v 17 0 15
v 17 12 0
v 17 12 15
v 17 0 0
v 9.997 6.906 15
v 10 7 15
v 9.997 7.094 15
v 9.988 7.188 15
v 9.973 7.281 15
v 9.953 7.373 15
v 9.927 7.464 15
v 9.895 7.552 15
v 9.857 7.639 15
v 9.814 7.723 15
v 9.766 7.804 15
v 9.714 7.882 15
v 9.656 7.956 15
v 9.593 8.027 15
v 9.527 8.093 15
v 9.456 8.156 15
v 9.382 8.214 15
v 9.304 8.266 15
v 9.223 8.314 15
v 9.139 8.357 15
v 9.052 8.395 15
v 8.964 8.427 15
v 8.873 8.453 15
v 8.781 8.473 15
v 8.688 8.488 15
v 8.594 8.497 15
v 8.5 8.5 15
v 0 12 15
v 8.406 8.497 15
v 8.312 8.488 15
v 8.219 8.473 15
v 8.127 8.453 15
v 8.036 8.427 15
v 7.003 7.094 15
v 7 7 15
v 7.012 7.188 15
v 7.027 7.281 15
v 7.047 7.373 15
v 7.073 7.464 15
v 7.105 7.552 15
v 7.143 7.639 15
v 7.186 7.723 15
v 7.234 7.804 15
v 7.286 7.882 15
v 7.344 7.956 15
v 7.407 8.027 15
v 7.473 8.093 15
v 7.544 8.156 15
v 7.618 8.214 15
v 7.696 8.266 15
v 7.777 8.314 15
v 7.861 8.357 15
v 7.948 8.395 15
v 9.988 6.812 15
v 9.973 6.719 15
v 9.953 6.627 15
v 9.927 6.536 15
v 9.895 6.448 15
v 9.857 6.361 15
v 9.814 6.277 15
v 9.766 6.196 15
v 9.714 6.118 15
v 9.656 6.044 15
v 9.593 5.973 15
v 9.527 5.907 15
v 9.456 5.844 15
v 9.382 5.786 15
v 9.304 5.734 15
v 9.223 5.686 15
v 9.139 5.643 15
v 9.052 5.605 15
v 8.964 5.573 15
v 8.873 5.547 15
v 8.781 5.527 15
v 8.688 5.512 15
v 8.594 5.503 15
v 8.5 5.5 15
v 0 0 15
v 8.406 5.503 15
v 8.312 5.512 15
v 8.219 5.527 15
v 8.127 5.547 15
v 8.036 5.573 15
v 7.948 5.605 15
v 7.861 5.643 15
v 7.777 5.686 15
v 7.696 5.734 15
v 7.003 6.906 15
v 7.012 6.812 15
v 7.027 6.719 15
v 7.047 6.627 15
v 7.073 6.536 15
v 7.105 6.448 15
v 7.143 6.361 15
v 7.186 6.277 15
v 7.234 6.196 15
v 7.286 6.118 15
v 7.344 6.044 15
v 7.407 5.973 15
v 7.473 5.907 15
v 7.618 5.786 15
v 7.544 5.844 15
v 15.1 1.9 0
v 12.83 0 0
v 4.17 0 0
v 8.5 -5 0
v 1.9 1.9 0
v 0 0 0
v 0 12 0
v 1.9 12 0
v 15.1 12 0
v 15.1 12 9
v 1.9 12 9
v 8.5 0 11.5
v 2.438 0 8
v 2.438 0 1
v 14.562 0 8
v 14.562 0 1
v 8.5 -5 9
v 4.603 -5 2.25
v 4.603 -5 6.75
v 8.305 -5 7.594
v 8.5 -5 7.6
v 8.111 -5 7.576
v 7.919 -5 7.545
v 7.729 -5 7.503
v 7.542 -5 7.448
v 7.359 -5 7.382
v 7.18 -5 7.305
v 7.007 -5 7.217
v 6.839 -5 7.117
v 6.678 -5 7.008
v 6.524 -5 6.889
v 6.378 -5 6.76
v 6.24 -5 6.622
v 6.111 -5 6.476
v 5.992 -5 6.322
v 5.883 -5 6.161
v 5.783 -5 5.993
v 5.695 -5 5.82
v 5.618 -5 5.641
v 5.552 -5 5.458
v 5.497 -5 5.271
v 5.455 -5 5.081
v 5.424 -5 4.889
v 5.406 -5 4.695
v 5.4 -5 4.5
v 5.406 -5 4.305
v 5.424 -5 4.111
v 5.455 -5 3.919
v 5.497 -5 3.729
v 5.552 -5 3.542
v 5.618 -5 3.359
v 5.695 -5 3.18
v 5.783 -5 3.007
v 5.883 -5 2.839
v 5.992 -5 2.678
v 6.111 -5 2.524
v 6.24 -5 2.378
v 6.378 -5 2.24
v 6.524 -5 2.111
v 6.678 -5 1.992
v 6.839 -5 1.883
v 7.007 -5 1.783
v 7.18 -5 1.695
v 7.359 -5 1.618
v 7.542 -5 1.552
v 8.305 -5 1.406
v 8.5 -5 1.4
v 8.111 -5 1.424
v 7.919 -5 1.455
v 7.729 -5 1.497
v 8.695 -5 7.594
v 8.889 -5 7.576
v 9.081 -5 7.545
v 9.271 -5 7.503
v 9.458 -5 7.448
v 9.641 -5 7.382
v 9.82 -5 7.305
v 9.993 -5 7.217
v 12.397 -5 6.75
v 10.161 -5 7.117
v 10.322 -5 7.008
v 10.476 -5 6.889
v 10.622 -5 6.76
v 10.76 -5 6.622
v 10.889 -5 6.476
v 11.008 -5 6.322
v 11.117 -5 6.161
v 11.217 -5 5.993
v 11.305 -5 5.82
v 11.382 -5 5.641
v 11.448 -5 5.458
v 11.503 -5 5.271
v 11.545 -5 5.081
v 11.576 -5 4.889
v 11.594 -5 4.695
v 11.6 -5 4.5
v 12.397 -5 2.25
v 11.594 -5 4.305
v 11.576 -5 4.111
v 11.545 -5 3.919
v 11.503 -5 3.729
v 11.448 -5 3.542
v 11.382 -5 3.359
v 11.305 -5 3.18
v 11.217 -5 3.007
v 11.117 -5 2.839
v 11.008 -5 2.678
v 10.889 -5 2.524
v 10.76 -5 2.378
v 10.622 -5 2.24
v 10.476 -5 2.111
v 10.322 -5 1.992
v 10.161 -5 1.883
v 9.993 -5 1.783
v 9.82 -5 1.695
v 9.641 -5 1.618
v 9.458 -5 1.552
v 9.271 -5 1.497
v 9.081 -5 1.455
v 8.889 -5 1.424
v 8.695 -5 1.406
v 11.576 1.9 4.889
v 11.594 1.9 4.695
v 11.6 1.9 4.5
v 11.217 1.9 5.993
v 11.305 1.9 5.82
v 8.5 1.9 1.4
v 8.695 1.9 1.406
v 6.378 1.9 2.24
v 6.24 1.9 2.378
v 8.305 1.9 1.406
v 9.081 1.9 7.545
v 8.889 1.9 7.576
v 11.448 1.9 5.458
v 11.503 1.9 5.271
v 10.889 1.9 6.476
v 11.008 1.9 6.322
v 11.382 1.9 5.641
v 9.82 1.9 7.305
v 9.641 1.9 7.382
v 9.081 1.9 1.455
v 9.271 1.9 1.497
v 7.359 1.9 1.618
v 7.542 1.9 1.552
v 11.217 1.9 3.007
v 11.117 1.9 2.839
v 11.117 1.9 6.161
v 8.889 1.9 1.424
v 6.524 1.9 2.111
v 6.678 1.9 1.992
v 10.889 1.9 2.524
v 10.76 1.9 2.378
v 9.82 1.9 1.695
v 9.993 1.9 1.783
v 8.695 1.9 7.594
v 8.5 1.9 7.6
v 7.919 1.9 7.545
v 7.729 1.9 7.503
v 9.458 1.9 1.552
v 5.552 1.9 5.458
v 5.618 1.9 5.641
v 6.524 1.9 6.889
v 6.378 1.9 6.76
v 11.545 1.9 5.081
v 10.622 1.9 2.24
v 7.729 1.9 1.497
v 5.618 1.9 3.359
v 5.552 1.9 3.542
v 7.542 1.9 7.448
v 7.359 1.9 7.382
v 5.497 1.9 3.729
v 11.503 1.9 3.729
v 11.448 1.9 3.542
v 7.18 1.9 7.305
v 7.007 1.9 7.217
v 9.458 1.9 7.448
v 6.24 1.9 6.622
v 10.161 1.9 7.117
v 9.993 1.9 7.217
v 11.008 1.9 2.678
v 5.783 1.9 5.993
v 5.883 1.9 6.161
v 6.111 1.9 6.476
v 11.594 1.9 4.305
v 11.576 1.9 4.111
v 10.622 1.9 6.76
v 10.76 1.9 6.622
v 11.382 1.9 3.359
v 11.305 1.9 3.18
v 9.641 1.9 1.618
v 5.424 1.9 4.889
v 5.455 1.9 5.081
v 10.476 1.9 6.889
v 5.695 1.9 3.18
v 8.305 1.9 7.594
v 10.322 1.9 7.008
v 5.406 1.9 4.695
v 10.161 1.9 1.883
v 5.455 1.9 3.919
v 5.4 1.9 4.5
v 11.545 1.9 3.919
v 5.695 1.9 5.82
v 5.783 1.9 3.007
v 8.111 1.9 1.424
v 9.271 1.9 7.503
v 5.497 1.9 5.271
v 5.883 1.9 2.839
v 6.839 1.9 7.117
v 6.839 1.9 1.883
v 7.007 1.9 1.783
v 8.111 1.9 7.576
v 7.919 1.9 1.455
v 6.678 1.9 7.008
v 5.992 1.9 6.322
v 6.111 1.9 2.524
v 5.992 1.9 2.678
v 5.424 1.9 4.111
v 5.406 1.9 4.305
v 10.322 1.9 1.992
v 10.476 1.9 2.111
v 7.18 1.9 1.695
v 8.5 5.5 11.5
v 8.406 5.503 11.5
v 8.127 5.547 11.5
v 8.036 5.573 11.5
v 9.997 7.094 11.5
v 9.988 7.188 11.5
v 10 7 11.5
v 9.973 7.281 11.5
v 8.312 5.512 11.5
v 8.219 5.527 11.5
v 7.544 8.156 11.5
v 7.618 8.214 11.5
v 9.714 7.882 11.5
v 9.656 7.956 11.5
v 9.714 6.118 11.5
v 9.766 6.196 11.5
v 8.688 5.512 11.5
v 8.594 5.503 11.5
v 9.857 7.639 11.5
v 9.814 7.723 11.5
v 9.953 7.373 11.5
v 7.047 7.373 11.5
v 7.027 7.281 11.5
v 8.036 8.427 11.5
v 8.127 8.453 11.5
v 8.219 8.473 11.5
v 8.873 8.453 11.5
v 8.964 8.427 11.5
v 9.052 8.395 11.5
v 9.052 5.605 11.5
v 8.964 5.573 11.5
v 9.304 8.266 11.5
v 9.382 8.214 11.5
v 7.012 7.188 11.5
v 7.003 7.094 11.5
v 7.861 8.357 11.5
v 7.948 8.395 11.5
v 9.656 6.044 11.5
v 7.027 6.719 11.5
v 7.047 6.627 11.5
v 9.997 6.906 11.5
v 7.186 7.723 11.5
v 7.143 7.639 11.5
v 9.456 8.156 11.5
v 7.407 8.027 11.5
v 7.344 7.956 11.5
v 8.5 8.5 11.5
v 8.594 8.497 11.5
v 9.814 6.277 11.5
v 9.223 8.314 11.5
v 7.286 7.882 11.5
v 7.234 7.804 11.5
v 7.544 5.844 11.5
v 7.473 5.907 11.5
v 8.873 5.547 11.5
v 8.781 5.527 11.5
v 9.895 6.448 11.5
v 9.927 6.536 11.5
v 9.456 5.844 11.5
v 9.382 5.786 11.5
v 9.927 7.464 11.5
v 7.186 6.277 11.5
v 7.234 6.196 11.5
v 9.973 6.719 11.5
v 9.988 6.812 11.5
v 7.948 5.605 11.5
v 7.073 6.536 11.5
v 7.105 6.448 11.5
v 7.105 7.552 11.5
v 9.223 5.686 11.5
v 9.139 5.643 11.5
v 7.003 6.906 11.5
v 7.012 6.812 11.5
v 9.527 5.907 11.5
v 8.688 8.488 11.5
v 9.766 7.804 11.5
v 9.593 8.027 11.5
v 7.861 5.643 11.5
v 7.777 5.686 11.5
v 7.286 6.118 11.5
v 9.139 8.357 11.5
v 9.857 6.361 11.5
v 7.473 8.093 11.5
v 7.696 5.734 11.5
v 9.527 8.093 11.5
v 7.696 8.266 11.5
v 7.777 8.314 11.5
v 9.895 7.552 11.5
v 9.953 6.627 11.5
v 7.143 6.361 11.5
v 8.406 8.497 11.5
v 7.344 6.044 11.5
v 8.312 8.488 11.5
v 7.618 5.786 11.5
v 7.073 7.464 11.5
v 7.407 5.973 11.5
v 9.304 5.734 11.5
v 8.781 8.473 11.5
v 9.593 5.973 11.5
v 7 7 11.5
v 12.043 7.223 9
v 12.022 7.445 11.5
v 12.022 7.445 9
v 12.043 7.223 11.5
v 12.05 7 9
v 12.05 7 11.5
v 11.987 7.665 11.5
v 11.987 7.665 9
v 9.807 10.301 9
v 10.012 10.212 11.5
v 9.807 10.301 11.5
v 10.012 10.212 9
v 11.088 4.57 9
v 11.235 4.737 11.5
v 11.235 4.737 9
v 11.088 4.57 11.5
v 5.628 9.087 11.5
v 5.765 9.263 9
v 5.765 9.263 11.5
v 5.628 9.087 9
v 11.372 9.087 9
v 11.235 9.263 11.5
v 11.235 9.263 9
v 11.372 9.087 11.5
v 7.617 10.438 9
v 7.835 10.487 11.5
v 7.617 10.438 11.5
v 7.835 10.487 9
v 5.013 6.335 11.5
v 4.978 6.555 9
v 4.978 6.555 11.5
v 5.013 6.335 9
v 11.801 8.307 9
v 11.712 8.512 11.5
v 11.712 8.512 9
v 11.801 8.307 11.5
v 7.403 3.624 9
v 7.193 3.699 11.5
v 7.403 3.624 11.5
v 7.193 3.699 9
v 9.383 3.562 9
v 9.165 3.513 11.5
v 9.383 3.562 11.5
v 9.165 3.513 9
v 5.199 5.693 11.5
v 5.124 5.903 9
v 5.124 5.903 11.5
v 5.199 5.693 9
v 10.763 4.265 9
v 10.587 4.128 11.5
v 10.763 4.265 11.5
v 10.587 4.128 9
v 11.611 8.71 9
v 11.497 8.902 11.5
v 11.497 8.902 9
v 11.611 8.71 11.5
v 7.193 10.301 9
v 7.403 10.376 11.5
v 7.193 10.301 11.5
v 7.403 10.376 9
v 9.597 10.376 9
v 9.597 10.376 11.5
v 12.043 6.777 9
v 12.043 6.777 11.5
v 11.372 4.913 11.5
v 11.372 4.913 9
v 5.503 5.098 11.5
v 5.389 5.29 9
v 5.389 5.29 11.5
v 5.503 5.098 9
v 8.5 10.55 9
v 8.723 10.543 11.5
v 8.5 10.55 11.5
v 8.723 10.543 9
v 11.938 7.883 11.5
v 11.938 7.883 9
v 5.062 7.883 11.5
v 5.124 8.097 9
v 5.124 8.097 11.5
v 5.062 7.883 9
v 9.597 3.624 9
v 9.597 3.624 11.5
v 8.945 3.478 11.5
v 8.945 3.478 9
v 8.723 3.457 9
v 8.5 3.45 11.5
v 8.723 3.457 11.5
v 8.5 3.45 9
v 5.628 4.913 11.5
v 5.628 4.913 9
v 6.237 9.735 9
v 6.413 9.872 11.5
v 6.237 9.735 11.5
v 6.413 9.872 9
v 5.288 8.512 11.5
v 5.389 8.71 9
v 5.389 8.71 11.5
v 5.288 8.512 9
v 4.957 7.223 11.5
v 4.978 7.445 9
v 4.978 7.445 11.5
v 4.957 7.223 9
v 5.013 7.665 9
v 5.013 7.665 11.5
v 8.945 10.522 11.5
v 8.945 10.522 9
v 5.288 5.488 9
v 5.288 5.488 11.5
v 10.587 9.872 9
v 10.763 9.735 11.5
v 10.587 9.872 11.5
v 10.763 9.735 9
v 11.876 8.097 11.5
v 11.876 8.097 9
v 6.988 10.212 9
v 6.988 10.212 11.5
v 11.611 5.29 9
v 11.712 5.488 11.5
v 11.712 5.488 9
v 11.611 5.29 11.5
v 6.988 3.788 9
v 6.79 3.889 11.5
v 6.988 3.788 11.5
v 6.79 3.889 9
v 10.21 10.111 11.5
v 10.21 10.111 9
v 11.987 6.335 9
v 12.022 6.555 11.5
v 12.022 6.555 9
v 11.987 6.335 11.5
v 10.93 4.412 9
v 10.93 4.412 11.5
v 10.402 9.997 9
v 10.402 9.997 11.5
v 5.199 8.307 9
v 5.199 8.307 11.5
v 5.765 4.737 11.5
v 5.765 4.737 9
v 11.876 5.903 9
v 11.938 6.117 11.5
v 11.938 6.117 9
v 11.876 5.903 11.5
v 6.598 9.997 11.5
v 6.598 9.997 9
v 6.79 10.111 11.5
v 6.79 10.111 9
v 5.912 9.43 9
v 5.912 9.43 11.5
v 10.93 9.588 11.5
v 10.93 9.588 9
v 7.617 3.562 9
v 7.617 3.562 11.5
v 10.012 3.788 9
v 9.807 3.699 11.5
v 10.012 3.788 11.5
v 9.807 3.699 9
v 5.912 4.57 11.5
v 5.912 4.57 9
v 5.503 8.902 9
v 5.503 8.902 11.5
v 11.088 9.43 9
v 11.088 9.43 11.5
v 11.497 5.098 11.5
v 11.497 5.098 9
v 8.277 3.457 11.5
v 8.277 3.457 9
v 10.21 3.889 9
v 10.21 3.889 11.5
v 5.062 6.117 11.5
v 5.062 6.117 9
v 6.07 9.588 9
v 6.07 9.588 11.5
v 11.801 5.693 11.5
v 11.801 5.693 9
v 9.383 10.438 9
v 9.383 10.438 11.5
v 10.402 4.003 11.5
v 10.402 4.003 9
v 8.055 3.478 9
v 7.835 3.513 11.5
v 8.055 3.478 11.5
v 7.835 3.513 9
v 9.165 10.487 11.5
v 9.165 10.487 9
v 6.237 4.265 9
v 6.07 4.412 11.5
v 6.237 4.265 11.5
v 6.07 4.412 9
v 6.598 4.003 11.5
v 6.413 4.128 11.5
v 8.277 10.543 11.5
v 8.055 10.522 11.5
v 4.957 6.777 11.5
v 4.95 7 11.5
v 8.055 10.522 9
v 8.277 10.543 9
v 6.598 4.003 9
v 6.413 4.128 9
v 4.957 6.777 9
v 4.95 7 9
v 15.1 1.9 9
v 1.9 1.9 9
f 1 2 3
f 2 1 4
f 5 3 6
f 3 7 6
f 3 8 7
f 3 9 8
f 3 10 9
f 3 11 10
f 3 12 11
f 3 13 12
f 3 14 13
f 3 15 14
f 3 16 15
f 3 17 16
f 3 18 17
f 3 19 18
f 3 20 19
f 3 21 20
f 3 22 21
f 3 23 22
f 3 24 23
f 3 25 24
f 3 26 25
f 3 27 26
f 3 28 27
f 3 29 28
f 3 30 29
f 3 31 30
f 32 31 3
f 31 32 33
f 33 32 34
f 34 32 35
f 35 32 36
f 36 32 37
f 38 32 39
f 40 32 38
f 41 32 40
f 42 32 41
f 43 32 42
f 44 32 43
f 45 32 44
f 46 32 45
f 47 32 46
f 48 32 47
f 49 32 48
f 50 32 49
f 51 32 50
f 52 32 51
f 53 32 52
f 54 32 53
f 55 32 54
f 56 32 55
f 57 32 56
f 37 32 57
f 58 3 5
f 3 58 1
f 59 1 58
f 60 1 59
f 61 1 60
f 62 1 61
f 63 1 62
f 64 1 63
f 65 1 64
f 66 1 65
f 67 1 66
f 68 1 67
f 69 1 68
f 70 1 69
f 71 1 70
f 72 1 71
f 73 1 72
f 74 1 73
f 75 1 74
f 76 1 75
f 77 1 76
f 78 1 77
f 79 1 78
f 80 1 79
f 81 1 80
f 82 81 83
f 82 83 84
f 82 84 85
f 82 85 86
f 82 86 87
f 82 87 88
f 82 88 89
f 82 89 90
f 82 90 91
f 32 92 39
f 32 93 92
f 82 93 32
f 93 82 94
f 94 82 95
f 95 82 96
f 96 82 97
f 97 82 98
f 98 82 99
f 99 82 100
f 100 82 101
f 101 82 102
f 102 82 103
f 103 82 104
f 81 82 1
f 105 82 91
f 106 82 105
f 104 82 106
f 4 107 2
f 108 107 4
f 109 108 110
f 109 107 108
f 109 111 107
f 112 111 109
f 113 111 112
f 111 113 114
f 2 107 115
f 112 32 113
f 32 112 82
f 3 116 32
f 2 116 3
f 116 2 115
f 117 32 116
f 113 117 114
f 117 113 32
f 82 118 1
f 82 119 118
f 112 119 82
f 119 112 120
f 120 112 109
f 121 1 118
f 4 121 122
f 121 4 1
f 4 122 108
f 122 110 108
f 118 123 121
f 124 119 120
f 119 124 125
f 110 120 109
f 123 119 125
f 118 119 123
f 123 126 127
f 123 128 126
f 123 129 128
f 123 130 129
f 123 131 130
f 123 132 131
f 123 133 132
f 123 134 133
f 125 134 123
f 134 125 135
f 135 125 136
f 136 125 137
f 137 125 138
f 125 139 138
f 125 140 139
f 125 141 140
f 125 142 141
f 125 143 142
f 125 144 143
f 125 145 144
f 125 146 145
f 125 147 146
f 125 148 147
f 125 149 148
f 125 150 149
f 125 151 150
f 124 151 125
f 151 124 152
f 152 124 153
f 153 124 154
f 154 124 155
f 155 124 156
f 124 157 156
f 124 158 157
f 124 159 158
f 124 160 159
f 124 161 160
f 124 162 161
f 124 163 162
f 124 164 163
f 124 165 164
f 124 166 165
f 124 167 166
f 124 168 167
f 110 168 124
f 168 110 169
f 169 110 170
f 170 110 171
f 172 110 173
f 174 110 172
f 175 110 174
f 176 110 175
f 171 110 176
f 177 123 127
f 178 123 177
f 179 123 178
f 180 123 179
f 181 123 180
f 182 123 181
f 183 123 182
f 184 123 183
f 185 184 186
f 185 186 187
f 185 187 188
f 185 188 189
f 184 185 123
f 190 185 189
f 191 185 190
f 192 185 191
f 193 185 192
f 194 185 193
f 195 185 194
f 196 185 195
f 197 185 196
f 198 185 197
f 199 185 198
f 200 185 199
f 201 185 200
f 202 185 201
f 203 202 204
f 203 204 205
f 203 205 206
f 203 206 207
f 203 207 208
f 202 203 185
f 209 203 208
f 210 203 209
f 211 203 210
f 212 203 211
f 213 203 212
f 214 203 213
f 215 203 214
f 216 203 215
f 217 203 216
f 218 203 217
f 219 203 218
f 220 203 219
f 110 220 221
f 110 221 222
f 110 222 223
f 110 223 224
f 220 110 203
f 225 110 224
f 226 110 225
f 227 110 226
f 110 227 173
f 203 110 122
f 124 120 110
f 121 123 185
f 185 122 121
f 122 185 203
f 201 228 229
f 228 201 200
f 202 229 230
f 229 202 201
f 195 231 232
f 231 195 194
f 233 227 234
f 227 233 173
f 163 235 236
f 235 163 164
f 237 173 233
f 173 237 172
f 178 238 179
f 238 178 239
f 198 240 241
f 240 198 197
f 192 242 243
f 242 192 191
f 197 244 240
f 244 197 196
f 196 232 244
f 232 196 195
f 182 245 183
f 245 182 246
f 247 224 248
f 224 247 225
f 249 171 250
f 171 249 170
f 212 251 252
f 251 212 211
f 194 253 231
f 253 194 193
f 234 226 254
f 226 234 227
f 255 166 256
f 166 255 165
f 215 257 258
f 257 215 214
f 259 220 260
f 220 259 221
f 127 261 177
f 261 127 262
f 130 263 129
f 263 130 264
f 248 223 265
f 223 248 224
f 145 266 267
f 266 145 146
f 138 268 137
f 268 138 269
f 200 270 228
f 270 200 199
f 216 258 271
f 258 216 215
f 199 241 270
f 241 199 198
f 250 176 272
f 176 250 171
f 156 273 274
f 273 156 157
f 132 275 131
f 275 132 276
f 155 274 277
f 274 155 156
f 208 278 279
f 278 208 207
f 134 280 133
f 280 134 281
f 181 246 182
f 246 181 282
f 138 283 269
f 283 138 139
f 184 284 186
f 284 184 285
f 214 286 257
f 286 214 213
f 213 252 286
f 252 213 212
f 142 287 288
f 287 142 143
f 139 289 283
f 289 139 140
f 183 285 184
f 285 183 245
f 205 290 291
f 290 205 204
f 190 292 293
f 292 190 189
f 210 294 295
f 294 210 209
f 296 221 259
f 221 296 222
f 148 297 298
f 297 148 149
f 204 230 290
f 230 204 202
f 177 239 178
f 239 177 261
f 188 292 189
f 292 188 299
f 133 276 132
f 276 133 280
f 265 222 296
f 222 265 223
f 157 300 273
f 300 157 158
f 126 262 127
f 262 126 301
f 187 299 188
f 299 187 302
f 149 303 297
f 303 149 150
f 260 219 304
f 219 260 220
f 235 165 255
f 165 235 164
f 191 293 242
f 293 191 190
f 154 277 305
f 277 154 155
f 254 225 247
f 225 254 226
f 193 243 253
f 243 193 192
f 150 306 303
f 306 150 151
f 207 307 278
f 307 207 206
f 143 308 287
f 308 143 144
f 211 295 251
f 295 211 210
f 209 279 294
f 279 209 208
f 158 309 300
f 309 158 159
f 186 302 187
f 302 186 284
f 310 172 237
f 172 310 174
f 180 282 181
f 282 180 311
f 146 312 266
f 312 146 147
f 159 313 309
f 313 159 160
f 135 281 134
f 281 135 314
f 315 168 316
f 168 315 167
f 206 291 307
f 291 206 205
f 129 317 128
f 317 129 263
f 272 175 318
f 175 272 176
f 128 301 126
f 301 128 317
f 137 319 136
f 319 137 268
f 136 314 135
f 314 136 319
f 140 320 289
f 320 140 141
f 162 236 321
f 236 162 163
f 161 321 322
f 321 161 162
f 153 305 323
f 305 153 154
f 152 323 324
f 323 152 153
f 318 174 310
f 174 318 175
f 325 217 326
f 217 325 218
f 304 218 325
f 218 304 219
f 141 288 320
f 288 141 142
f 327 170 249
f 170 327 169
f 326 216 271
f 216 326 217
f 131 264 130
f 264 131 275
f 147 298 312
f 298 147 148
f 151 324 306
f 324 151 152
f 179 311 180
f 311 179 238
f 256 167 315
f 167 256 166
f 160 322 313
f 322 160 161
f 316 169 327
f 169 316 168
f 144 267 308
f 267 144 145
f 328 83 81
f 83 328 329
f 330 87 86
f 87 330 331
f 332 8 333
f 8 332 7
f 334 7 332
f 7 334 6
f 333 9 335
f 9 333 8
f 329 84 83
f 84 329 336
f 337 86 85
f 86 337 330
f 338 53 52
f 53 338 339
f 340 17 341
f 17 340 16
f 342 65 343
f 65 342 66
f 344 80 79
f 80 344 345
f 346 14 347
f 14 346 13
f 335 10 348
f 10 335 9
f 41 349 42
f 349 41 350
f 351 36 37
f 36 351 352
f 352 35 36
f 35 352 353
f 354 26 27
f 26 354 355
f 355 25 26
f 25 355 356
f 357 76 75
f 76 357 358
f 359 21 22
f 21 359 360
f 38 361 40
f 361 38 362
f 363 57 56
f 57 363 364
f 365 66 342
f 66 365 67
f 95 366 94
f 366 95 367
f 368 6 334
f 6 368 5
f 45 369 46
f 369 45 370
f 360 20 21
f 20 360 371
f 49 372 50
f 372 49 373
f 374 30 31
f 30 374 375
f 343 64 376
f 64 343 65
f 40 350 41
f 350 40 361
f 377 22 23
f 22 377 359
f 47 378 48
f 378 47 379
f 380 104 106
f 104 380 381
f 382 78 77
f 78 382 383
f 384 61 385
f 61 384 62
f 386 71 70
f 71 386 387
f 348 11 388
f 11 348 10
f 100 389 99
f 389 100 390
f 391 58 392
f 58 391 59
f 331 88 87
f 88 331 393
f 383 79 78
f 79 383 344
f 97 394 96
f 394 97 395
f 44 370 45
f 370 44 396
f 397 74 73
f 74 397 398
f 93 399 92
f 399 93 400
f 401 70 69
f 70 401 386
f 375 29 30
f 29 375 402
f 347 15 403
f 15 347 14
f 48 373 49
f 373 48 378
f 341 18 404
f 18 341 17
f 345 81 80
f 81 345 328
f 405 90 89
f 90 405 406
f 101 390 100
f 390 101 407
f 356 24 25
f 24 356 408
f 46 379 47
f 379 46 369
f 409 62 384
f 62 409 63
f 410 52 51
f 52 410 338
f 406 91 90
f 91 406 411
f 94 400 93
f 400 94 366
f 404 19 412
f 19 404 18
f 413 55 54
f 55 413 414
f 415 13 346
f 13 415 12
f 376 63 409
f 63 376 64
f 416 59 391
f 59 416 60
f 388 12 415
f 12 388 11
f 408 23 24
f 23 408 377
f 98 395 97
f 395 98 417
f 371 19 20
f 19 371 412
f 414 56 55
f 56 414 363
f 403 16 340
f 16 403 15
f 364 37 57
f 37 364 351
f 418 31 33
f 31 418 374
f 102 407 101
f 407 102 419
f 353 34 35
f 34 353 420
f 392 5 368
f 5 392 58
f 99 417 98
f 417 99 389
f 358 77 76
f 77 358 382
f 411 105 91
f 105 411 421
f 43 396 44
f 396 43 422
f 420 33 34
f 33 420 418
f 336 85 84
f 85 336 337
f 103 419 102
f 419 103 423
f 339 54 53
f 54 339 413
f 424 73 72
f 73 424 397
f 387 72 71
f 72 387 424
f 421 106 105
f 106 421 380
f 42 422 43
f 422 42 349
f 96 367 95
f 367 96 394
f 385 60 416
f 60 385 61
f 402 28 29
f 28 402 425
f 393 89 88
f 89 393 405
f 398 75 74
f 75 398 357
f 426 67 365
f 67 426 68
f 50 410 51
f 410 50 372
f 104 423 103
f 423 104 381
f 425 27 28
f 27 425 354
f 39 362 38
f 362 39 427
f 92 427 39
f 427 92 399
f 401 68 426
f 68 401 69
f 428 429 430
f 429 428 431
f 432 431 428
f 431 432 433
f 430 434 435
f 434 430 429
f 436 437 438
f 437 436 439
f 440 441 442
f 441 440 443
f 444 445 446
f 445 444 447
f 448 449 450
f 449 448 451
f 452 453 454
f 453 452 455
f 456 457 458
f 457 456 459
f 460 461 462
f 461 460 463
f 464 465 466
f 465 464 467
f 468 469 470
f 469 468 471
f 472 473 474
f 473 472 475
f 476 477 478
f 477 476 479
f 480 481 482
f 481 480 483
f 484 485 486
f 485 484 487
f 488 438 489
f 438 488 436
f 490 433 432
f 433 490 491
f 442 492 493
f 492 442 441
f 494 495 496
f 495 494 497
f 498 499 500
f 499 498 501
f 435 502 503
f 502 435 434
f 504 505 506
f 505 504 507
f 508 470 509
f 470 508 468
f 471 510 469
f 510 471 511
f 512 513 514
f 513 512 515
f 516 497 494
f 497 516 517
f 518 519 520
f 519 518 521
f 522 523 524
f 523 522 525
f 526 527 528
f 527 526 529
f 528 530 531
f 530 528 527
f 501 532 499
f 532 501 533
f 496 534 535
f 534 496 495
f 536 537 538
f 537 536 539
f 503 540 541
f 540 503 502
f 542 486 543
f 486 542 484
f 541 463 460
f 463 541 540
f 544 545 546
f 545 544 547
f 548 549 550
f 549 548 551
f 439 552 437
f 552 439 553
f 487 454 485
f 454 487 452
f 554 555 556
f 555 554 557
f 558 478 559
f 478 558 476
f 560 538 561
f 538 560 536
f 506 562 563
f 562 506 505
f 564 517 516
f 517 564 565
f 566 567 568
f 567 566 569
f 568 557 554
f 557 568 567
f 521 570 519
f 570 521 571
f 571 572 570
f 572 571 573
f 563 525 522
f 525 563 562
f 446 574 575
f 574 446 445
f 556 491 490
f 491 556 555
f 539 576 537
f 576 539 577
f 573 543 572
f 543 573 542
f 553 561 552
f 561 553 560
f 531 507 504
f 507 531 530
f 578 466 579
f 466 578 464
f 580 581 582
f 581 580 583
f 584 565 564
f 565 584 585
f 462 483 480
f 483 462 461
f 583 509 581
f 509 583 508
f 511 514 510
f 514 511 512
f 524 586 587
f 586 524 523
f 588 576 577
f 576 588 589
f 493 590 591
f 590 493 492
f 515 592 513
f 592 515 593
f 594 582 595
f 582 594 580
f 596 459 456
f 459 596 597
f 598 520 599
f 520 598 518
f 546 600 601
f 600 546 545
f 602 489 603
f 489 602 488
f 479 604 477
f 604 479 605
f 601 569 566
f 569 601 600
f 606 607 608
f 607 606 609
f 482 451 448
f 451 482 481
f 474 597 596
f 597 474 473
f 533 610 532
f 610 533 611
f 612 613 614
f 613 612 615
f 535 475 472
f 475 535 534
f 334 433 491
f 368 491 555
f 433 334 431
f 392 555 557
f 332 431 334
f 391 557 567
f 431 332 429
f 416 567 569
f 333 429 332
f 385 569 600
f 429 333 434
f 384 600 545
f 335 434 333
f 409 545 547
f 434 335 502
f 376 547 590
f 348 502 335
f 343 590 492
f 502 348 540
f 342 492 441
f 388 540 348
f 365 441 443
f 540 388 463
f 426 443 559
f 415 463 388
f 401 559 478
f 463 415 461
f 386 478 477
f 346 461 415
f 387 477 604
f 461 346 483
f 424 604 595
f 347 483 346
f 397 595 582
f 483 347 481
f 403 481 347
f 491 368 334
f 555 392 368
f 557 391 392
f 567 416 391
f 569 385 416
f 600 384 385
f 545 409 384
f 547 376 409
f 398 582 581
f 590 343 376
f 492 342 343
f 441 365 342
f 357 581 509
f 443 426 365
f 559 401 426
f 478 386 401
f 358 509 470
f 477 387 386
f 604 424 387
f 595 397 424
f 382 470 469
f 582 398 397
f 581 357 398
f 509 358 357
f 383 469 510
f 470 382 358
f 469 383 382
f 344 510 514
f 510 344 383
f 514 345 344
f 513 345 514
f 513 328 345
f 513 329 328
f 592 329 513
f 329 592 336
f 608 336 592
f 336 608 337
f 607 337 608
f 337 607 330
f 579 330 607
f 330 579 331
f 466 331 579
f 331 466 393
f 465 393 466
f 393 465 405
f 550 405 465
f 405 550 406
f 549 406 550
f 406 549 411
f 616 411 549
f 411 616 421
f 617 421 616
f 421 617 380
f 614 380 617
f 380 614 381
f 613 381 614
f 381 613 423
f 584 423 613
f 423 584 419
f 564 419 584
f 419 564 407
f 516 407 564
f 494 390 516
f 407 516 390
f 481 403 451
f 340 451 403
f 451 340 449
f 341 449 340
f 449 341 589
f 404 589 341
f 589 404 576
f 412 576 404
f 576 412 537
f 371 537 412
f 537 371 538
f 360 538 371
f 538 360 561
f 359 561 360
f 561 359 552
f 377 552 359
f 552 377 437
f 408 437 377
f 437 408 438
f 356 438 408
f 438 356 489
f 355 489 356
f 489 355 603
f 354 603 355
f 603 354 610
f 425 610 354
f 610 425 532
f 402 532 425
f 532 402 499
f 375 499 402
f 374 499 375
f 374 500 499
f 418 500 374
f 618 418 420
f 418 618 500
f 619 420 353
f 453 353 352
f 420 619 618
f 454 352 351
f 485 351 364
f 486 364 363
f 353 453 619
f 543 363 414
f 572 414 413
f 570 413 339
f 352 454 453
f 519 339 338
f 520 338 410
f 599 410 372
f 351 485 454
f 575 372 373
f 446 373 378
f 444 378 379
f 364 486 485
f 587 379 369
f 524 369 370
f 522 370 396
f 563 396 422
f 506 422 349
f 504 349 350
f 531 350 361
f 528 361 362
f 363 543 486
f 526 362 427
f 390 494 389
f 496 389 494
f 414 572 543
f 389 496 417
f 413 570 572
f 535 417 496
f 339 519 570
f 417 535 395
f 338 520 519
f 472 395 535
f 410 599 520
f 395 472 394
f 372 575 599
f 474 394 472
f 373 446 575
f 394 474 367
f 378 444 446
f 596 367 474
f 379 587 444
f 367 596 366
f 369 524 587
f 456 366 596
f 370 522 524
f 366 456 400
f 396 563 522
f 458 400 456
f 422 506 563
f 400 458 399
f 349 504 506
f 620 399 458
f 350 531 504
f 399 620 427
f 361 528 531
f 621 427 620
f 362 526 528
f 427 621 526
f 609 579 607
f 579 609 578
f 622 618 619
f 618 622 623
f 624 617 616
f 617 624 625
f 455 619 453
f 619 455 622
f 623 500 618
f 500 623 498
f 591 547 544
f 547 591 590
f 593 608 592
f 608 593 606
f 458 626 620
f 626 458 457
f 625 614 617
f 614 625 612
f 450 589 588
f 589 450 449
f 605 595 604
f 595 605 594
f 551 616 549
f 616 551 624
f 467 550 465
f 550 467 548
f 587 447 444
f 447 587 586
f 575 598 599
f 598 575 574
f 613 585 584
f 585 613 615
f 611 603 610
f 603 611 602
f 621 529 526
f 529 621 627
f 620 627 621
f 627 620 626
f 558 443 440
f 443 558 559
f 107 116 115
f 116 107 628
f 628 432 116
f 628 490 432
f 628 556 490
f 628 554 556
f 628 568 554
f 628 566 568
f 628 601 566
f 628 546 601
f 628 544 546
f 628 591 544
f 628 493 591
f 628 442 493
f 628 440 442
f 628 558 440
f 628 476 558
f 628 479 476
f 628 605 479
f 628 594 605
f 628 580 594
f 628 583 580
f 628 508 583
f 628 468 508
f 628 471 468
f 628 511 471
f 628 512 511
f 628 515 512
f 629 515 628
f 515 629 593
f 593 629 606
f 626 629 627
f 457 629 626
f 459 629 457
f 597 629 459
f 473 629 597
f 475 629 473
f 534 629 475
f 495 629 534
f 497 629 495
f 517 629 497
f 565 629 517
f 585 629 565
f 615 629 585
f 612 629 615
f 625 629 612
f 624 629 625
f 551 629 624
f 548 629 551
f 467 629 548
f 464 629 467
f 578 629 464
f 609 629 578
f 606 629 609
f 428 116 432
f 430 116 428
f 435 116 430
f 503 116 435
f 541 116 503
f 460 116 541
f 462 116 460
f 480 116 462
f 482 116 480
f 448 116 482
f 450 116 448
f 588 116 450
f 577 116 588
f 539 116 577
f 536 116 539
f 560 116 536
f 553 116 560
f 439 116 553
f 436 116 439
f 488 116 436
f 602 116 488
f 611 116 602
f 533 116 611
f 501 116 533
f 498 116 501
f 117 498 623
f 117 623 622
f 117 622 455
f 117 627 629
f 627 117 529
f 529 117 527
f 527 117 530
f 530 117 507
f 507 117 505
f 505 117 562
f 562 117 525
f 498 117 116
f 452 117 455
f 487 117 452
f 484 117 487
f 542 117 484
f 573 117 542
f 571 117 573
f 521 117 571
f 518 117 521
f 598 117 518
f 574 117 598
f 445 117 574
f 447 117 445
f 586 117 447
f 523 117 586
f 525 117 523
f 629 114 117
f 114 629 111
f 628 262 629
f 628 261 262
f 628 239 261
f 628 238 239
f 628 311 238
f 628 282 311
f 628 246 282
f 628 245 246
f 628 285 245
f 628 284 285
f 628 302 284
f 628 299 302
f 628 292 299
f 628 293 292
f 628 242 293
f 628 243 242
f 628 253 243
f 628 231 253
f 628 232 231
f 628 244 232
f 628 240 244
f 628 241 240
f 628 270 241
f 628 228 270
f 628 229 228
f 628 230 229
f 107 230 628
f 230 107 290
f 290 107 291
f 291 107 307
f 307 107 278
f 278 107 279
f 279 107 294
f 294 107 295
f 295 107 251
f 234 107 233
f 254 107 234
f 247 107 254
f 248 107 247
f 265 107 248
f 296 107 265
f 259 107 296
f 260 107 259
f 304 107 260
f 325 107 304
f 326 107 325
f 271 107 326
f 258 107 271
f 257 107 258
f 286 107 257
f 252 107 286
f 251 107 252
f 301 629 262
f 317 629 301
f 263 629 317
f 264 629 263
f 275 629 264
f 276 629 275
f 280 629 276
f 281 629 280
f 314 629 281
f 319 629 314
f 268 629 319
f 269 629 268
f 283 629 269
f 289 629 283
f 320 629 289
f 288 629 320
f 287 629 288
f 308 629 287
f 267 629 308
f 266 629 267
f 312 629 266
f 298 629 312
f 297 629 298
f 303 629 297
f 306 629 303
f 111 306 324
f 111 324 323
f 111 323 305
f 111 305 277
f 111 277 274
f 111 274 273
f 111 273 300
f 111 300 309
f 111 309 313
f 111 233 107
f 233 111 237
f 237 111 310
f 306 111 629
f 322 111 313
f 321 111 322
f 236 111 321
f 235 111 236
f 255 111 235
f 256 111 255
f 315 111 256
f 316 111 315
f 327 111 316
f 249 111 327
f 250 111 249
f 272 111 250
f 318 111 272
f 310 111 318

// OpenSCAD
box_x=13;
box_y=10;
box_z=8;

wall_width=2;

max_box_x=box_x+wall_width*2;
max_box_y=box_y+wall_width;
max_box_z=box_z+wall_width*2+3;

    toleranze=0.2;


difference() {
    

    

    union(){
        cube(size = [max_box_x,max_box_y,max_box_z]);
        translate([max_box_x/2,0,box_z/2+.5]) rotate([90,90,0]) cylinder(h = 5, r1 =7,r2=4.5, $fn=6);    
    }

    translate([max_box_x/2,box_y/2+wall_width,box_z/2+.5]) rotate([90,0,0]) cylinder(h = 100, r =3.1, $fn=100);

    translate([max_box_x/2,box_y/2+wall_width,0])cylinder(h = 100, r = 1.5, $fn=100);
    translate([max_box_x/2,box_y/2+wall_width,0])cylinder(h = box_z+3.5, r = 3.55, $fn=100);
    
    translate([wall_width-toleranze/2,wall_width-toleranze/2,0])cube(size = [box_x+toleranze,box_y+toleranze,box_z+1]);

    translate([-50,-50,-max_box_z])cube(size = [100,100,max_box_z]);
}
